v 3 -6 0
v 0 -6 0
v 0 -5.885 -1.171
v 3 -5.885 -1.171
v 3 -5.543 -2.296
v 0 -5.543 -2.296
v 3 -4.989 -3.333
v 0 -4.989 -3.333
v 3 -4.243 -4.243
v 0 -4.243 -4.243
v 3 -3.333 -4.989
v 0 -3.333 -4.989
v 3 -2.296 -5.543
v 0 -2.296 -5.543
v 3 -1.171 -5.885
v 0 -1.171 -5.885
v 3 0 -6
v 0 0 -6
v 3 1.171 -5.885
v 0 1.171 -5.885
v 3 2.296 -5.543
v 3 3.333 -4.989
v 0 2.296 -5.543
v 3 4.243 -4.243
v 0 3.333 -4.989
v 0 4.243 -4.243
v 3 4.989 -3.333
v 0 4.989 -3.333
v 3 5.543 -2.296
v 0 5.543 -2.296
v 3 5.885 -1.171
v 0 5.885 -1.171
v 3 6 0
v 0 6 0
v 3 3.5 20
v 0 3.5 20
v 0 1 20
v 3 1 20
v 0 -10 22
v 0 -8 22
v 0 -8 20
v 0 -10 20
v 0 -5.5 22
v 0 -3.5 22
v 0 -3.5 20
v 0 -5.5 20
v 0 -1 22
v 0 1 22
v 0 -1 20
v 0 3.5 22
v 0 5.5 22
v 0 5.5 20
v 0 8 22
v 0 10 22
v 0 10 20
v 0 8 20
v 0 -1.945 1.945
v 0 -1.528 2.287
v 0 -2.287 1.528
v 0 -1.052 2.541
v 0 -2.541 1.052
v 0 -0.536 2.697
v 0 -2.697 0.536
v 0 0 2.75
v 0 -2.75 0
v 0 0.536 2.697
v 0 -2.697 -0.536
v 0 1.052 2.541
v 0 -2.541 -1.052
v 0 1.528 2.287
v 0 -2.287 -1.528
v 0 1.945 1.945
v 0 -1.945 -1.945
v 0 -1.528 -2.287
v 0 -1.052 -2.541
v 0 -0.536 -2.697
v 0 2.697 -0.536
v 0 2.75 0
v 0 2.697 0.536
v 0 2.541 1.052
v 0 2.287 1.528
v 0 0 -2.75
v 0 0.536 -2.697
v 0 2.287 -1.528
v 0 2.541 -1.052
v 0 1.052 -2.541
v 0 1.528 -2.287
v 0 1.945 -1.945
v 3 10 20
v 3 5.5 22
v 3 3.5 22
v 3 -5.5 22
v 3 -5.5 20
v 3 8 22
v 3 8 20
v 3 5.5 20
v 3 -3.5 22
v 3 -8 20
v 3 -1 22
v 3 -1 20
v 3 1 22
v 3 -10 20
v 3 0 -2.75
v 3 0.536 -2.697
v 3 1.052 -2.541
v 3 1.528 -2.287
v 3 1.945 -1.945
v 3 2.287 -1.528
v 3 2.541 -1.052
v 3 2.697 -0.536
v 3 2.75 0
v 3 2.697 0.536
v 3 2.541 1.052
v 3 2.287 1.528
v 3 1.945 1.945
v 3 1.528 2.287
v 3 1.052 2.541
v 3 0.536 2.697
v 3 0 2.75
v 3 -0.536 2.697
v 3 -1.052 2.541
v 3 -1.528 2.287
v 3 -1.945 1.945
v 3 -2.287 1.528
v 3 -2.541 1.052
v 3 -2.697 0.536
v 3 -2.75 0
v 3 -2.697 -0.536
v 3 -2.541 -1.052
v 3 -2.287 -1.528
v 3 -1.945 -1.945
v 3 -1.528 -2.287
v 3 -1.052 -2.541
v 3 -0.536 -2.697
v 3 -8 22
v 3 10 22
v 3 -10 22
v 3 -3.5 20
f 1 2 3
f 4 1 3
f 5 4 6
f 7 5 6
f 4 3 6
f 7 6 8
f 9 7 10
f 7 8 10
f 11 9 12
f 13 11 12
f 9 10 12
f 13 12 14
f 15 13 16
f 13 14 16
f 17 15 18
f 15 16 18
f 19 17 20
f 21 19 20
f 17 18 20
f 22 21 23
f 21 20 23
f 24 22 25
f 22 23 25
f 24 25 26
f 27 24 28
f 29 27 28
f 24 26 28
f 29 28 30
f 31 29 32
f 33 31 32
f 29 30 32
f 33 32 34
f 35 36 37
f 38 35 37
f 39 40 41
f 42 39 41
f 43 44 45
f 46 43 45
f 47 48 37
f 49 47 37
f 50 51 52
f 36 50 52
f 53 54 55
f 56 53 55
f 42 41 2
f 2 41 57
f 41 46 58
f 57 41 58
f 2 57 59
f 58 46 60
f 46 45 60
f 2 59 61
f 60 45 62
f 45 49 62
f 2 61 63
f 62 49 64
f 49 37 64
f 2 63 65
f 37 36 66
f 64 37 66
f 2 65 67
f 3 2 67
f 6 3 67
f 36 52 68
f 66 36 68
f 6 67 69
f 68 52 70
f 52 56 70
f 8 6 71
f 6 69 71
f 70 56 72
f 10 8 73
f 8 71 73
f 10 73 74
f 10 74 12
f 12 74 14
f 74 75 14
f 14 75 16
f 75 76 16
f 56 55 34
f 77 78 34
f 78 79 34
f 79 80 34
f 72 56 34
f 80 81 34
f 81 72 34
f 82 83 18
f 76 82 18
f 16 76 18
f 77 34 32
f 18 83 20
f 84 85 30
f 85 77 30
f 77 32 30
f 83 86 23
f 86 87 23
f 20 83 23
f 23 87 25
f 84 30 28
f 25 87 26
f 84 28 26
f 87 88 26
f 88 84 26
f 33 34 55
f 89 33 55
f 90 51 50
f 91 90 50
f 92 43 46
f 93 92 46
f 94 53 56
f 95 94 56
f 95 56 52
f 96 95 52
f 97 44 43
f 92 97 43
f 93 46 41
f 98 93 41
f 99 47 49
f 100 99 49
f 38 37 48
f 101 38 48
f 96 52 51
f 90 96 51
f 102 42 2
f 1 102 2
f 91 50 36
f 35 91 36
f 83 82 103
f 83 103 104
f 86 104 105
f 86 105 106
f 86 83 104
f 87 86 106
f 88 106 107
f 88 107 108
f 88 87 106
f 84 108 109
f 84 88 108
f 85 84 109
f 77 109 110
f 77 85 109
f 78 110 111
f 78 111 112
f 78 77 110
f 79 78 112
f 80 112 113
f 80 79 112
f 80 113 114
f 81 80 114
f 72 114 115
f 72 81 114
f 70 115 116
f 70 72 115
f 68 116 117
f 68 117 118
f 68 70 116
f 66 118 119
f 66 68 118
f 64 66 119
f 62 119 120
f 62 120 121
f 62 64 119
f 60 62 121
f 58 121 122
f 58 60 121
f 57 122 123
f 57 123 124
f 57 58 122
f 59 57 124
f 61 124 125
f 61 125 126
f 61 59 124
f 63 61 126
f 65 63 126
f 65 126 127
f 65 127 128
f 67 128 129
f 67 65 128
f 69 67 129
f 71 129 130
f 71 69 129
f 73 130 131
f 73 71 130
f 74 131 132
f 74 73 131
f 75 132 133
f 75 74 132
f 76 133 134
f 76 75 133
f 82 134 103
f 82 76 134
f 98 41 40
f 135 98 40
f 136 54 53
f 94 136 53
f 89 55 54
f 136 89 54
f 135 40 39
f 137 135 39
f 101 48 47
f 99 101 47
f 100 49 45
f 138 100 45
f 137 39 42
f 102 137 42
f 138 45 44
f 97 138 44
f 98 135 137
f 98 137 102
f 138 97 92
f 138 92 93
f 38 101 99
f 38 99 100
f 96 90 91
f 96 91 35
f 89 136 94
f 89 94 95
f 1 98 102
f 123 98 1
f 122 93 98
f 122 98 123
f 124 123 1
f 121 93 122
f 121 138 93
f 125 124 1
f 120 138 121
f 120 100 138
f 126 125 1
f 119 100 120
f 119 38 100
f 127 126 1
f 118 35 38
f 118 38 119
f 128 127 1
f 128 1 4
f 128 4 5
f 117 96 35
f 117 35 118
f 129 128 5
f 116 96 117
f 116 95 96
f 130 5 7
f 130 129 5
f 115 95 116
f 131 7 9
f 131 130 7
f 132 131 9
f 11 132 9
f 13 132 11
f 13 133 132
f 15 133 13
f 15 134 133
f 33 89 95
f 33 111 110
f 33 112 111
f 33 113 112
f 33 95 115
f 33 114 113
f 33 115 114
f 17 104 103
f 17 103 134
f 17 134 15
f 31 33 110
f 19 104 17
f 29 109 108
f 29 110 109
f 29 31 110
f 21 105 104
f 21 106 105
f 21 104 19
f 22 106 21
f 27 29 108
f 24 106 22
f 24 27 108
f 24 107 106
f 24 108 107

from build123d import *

# Parameters (mm, degrees)
SKETCH1_R           = 2.75
BOSS_EXTRUDE1_DEPTH = 3


with BuildPart() as part:
    # Sketch1 → Boss-Extrude1 (new body)
    with BuildSketch(Plane(origin=(0, 0, 0), x_dir=(0, 0, -1), z_dir=(1, 0, 0))):
        with BuildLine():
            Line((-20, 5.5), (-22, 5.5))
            Line((-22, 5.5), (-22, 3.5))
            Line((-22, 3.5), (-20, 3.5))
            Line((-20, 3.5), (-20, 1))
            Line((-20, 1), (-22, 1))
            Line((-22, 1), (-22, -1))
            Line((-22, -1), (-20, -1))
            Line((-20, -1), (-20, -3.5))
            Line((-20, -3.5), (-22, -3.5))
            Line((-22, -3.5), (-22, -5.5))
            Line((-22, -5.5), (-20, -5.5))
            Line((-20, -5.5), (-20, -8))
            Line((-20, -8), (-22, -8))
            Line((-22, -8), (-22, -10))
            Line((-22, -10), (-20, -10))
            Line((-20, -10), (0, -6))
            ThreePointArc((0, -6), (6, 0), (0, 6))
            Line((0, 6), (-20, 10))
            Line((-20, 10), (-22, 10))
            Line((-22, 10), (-22, 8))
            Line((-22, 8), (-20, 8))
            Line((-20, 8), (-20, 5.5))
        make_face()
        Circle(SKETCH1_R, mode=Mode.SUBTRACT)
    extrude(amount=BOSS_EXTRUDE1_DEPTH)


solid = part.part
